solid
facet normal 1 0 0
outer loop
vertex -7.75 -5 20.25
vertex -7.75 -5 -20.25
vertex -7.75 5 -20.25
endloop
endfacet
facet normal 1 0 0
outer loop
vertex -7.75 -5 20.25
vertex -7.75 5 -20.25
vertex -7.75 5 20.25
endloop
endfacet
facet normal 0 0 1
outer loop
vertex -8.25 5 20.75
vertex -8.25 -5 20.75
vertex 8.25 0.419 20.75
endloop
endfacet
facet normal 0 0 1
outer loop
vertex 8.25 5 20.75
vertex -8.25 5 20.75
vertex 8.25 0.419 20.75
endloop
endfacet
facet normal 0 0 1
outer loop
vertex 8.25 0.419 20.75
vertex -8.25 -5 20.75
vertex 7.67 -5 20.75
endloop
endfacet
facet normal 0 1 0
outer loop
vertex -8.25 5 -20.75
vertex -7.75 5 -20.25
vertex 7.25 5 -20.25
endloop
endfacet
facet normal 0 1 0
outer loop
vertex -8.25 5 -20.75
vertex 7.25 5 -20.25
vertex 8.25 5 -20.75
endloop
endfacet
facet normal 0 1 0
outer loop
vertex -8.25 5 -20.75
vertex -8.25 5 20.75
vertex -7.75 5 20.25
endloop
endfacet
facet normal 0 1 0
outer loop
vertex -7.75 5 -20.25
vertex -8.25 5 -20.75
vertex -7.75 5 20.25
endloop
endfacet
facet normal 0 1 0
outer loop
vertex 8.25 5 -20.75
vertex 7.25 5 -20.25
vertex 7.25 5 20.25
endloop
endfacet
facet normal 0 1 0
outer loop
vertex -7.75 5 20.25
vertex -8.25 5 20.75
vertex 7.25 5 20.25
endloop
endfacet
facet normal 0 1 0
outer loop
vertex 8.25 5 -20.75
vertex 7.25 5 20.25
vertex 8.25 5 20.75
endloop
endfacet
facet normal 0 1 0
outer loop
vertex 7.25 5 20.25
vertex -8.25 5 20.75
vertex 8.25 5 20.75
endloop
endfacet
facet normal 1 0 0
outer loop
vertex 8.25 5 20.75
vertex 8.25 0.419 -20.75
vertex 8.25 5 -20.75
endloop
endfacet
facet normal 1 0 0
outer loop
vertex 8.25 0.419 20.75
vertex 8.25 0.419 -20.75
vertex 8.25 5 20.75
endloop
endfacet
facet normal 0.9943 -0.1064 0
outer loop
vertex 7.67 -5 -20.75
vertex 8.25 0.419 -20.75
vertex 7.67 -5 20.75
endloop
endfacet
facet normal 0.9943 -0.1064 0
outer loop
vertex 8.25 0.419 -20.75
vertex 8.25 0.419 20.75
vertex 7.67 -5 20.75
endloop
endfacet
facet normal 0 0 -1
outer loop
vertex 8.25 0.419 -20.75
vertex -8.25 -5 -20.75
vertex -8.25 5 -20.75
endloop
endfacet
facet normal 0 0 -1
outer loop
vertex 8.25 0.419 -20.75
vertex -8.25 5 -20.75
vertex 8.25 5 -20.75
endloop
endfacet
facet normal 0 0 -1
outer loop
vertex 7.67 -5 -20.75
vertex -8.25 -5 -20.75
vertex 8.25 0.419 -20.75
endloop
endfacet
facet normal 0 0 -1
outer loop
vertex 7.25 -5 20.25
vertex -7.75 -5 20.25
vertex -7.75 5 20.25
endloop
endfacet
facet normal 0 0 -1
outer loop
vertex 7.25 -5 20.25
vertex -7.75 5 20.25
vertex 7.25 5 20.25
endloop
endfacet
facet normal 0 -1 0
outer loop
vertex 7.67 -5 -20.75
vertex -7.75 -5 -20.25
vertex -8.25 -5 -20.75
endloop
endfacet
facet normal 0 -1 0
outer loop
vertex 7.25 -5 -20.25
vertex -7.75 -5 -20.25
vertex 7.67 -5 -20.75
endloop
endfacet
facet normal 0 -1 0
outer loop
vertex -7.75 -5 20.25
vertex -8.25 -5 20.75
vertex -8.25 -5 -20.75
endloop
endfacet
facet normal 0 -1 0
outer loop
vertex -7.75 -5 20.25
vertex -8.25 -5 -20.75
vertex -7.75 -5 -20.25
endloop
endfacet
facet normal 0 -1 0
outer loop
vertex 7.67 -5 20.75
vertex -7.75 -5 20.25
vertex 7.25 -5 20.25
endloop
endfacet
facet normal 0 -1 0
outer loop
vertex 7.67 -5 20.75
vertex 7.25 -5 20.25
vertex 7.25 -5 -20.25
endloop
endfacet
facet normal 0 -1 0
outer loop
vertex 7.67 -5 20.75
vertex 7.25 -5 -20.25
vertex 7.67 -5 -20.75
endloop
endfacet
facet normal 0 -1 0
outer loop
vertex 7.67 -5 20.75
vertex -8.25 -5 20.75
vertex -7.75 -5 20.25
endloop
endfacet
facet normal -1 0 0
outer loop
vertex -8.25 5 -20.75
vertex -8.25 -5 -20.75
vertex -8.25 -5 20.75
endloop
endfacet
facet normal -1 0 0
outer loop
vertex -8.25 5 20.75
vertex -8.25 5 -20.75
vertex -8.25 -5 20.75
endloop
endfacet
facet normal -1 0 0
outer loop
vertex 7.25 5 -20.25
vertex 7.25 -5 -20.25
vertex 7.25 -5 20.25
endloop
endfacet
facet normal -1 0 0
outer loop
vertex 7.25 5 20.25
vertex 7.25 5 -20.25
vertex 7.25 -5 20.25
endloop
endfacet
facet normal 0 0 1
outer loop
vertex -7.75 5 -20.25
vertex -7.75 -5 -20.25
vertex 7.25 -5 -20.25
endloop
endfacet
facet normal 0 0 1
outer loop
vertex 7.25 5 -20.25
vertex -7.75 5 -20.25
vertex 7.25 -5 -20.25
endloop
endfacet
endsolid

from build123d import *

# Parameters (mm, degrees)
F0_W     = 16.5
F0_H     = 41.5
F1_DEPTH = 5
F2_W     = 15
F2_H     = 40.5
F3_DEPTH = 12.5
F5_DEPTH = 22.8


with BuildPart() as f1:
    # F0 (on Front) → F1 (new body, symmetric)
    with BuildSketch(Plane.XZ):
        Rectangle(F0_W, F0_H)
    extrude(amount=F1_DEPTH, both=True)

    # F2 (on Front) → F3 (cut, symmetric)
    with BuildSketch(Plane.XZ):
        with Locations((-0.25, 0)):
            Rectangle(F2_W, F2_H)
    extrude(amount=F3_DEPTH, both=True, mode=Mode.SUBTRACT)

    # F4 (on Top) → F5 (cut, symmetric)
    with BuildSketch(Plane.XY):
        Polygon((10.645687, 0.322955), (8.267023, 0.577699), (7.596283, -5.685302), (10.645687, -6.162507), align=None)
    extrude(amount=F5_DEPTH, both=True, mode=Mode.SUBTRACT)


solid = f1.part
